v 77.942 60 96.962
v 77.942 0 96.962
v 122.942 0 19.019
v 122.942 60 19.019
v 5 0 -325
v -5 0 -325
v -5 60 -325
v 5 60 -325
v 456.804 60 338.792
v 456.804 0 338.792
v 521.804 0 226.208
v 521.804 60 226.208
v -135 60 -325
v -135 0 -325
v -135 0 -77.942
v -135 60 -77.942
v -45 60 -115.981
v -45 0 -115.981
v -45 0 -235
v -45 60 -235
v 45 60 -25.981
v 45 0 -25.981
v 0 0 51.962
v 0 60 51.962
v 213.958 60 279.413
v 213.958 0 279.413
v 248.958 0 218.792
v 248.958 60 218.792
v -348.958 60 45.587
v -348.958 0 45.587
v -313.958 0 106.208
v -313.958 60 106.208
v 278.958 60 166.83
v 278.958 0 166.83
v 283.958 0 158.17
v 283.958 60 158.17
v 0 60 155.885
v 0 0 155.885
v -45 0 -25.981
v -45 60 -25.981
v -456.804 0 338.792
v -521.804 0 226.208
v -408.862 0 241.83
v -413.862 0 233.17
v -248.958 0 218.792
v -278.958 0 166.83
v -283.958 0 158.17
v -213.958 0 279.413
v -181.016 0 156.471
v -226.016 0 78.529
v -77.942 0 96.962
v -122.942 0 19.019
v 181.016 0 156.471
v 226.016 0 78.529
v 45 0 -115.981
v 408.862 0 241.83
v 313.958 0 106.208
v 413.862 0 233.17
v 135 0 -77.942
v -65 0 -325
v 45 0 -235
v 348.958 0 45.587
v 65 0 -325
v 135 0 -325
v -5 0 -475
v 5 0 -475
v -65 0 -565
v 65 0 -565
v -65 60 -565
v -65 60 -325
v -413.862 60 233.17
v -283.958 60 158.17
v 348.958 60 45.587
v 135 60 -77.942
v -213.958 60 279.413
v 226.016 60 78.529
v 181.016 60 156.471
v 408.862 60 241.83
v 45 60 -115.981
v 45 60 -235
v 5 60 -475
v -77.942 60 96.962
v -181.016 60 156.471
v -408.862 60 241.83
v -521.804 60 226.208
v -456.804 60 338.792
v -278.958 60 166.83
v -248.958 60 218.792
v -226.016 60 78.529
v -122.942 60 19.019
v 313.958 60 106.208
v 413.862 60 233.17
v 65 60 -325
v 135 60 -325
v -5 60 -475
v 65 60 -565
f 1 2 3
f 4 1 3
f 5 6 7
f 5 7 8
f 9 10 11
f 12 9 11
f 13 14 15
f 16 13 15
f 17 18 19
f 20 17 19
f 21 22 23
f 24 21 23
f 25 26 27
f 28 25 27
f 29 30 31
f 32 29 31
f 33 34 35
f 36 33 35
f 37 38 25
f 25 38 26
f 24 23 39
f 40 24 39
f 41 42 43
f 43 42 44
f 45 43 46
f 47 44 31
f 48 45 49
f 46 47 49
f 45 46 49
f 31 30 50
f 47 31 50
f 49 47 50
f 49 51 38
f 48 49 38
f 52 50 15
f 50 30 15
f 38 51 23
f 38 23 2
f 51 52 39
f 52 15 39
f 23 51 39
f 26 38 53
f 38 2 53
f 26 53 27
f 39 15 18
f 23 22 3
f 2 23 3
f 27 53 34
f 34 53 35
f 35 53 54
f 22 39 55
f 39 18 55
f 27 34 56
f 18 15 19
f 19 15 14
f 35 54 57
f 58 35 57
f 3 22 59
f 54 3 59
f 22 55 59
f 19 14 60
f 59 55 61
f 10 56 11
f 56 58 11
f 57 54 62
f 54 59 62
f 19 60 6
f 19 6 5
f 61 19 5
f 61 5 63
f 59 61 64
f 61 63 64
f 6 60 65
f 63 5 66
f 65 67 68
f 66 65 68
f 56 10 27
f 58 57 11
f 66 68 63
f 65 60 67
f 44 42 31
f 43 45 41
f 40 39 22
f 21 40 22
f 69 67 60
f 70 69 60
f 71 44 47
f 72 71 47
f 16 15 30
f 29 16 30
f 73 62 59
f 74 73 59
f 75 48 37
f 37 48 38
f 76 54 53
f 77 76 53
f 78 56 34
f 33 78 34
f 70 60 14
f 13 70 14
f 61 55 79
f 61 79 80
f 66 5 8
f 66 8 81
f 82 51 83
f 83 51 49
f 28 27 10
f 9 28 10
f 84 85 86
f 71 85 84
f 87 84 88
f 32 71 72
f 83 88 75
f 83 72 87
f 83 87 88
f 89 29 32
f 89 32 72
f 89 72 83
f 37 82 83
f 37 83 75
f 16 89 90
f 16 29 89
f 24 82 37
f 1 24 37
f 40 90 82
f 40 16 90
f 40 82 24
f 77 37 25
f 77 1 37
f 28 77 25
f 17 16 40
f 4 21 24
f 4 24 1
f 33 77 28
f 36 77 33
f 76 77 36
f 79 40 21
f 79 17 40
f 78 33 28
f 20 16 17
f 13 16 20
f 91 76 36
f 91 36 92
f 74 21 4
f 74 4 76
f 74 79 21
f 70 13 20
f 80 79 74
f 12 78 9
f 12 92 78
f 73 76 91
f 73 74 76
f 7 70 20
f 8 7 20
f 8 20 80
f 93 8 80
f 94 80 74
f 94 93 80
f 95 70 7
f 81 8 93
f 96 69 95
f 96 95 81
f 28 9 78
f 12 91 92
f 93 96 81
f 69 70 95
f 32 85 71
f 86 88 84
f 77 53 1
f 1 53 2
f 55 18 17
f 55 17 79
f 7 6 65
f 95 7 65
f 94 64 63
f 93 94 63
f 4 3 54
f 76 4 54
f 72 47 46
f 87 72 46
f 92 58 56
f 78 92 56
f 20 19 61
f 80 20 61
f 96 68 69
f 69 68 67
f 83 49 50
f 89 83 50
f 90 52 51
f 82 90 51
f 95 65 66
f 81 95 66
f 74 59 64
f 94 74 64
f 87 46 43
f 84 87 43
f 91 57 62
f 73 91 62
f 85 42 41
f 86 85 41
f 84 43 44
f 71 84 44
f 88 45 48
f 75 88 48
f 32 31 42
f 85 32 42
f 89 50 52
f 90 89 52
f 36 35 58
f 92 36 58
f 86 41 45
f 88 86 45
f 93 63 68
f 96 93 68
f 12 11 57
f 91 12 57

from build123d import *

# Parameters (mm, degrees)
CROQUIS1_W              = 90
CROQUIS1_H              = 119.019237886
CROQUIS1_W_2            = 10
CROQUIS1_H_2            = 150
SALIENTE_EXTRUIR1_DEPTH = 60


with BuildPart() as part:
    # Croquis1 → Saliente-Extruir1 (new body)
    with BuildSketch(Plane(origin=(0, 0, 0), x_dir=(1, 0, 0), z_dir=(0, 1, 0))):
        Polygon((-213.95825623, -279.413429511), (0, -155.884572681), (213.95825623, -279.413429511), (248.95825623, -218.791651246), (456.804353138, -338.791651246), (521.804353138, -226.208348754), (313.95825623, -106.208348754), (348.95825623, -45.586570489), (135, 77.942286341), (135, 325), (65, 325), (65, 565), (-65, 565), (-65, 325), (-135, 325), (-135, 77.942286341), (-348.95825623, -45.586570489), (-313.95825623, -106.208348754), (-521.804353138, -226.208348754), (-456.804353138, -338.791651246), (-248.95825623, -218.791651246), align=None)
        Polygon((278.95825623, -166.830127019), (283.95825623, -158.169872981), (348.910161514, -195.669872981), (413.862066798, -233.169872981), (408.862066798, -241.830127019), (343.910161514, -204.330127019), align=None, mode=Mode.SUBTRACT)
        Polygon((-408.862066798, -241.830127019), (-413.862066798, -233.169872981), (-283.95825623, -158.169872981), (-278.95825623, -166.830127019), align=None, mode=Mode.SUBTRACT)
        Polygon((-122.942286341, -19.019237886), (-77.942286341, -96.961524227), (-181.015969889, -156.47114317), (-226.015969889, -78.52885683), align=None, mode=Mode.SUBTRACT)
        Polygon((181.015969889, -156.47114317), (77.942286341, -96.961524227), (122.942286341, -19.019237886), (226.015969889, -78.52885683), align=None, mode=Mode.SUBTRACT)
        Polygon((0, -51.961524227), (-45, 25.980762114), (45, 25.980762114), align=None, mode=Mode.SUBTRACT)
        with Locations((0, 175.490381057)):
            Rectangle(CROQUIS1_W, CROQUIS1_H, mode=Mode.SUBTRACT)
        with Locations((0, 400)):
            Rectangle(CROQUIS1_W_2, CROQUIS1_H_2, mode=Mode.SUBTRACT)
    extrude(amount=SALIENTE_EXTRUIR1_DEPTH)


solid = part.part
